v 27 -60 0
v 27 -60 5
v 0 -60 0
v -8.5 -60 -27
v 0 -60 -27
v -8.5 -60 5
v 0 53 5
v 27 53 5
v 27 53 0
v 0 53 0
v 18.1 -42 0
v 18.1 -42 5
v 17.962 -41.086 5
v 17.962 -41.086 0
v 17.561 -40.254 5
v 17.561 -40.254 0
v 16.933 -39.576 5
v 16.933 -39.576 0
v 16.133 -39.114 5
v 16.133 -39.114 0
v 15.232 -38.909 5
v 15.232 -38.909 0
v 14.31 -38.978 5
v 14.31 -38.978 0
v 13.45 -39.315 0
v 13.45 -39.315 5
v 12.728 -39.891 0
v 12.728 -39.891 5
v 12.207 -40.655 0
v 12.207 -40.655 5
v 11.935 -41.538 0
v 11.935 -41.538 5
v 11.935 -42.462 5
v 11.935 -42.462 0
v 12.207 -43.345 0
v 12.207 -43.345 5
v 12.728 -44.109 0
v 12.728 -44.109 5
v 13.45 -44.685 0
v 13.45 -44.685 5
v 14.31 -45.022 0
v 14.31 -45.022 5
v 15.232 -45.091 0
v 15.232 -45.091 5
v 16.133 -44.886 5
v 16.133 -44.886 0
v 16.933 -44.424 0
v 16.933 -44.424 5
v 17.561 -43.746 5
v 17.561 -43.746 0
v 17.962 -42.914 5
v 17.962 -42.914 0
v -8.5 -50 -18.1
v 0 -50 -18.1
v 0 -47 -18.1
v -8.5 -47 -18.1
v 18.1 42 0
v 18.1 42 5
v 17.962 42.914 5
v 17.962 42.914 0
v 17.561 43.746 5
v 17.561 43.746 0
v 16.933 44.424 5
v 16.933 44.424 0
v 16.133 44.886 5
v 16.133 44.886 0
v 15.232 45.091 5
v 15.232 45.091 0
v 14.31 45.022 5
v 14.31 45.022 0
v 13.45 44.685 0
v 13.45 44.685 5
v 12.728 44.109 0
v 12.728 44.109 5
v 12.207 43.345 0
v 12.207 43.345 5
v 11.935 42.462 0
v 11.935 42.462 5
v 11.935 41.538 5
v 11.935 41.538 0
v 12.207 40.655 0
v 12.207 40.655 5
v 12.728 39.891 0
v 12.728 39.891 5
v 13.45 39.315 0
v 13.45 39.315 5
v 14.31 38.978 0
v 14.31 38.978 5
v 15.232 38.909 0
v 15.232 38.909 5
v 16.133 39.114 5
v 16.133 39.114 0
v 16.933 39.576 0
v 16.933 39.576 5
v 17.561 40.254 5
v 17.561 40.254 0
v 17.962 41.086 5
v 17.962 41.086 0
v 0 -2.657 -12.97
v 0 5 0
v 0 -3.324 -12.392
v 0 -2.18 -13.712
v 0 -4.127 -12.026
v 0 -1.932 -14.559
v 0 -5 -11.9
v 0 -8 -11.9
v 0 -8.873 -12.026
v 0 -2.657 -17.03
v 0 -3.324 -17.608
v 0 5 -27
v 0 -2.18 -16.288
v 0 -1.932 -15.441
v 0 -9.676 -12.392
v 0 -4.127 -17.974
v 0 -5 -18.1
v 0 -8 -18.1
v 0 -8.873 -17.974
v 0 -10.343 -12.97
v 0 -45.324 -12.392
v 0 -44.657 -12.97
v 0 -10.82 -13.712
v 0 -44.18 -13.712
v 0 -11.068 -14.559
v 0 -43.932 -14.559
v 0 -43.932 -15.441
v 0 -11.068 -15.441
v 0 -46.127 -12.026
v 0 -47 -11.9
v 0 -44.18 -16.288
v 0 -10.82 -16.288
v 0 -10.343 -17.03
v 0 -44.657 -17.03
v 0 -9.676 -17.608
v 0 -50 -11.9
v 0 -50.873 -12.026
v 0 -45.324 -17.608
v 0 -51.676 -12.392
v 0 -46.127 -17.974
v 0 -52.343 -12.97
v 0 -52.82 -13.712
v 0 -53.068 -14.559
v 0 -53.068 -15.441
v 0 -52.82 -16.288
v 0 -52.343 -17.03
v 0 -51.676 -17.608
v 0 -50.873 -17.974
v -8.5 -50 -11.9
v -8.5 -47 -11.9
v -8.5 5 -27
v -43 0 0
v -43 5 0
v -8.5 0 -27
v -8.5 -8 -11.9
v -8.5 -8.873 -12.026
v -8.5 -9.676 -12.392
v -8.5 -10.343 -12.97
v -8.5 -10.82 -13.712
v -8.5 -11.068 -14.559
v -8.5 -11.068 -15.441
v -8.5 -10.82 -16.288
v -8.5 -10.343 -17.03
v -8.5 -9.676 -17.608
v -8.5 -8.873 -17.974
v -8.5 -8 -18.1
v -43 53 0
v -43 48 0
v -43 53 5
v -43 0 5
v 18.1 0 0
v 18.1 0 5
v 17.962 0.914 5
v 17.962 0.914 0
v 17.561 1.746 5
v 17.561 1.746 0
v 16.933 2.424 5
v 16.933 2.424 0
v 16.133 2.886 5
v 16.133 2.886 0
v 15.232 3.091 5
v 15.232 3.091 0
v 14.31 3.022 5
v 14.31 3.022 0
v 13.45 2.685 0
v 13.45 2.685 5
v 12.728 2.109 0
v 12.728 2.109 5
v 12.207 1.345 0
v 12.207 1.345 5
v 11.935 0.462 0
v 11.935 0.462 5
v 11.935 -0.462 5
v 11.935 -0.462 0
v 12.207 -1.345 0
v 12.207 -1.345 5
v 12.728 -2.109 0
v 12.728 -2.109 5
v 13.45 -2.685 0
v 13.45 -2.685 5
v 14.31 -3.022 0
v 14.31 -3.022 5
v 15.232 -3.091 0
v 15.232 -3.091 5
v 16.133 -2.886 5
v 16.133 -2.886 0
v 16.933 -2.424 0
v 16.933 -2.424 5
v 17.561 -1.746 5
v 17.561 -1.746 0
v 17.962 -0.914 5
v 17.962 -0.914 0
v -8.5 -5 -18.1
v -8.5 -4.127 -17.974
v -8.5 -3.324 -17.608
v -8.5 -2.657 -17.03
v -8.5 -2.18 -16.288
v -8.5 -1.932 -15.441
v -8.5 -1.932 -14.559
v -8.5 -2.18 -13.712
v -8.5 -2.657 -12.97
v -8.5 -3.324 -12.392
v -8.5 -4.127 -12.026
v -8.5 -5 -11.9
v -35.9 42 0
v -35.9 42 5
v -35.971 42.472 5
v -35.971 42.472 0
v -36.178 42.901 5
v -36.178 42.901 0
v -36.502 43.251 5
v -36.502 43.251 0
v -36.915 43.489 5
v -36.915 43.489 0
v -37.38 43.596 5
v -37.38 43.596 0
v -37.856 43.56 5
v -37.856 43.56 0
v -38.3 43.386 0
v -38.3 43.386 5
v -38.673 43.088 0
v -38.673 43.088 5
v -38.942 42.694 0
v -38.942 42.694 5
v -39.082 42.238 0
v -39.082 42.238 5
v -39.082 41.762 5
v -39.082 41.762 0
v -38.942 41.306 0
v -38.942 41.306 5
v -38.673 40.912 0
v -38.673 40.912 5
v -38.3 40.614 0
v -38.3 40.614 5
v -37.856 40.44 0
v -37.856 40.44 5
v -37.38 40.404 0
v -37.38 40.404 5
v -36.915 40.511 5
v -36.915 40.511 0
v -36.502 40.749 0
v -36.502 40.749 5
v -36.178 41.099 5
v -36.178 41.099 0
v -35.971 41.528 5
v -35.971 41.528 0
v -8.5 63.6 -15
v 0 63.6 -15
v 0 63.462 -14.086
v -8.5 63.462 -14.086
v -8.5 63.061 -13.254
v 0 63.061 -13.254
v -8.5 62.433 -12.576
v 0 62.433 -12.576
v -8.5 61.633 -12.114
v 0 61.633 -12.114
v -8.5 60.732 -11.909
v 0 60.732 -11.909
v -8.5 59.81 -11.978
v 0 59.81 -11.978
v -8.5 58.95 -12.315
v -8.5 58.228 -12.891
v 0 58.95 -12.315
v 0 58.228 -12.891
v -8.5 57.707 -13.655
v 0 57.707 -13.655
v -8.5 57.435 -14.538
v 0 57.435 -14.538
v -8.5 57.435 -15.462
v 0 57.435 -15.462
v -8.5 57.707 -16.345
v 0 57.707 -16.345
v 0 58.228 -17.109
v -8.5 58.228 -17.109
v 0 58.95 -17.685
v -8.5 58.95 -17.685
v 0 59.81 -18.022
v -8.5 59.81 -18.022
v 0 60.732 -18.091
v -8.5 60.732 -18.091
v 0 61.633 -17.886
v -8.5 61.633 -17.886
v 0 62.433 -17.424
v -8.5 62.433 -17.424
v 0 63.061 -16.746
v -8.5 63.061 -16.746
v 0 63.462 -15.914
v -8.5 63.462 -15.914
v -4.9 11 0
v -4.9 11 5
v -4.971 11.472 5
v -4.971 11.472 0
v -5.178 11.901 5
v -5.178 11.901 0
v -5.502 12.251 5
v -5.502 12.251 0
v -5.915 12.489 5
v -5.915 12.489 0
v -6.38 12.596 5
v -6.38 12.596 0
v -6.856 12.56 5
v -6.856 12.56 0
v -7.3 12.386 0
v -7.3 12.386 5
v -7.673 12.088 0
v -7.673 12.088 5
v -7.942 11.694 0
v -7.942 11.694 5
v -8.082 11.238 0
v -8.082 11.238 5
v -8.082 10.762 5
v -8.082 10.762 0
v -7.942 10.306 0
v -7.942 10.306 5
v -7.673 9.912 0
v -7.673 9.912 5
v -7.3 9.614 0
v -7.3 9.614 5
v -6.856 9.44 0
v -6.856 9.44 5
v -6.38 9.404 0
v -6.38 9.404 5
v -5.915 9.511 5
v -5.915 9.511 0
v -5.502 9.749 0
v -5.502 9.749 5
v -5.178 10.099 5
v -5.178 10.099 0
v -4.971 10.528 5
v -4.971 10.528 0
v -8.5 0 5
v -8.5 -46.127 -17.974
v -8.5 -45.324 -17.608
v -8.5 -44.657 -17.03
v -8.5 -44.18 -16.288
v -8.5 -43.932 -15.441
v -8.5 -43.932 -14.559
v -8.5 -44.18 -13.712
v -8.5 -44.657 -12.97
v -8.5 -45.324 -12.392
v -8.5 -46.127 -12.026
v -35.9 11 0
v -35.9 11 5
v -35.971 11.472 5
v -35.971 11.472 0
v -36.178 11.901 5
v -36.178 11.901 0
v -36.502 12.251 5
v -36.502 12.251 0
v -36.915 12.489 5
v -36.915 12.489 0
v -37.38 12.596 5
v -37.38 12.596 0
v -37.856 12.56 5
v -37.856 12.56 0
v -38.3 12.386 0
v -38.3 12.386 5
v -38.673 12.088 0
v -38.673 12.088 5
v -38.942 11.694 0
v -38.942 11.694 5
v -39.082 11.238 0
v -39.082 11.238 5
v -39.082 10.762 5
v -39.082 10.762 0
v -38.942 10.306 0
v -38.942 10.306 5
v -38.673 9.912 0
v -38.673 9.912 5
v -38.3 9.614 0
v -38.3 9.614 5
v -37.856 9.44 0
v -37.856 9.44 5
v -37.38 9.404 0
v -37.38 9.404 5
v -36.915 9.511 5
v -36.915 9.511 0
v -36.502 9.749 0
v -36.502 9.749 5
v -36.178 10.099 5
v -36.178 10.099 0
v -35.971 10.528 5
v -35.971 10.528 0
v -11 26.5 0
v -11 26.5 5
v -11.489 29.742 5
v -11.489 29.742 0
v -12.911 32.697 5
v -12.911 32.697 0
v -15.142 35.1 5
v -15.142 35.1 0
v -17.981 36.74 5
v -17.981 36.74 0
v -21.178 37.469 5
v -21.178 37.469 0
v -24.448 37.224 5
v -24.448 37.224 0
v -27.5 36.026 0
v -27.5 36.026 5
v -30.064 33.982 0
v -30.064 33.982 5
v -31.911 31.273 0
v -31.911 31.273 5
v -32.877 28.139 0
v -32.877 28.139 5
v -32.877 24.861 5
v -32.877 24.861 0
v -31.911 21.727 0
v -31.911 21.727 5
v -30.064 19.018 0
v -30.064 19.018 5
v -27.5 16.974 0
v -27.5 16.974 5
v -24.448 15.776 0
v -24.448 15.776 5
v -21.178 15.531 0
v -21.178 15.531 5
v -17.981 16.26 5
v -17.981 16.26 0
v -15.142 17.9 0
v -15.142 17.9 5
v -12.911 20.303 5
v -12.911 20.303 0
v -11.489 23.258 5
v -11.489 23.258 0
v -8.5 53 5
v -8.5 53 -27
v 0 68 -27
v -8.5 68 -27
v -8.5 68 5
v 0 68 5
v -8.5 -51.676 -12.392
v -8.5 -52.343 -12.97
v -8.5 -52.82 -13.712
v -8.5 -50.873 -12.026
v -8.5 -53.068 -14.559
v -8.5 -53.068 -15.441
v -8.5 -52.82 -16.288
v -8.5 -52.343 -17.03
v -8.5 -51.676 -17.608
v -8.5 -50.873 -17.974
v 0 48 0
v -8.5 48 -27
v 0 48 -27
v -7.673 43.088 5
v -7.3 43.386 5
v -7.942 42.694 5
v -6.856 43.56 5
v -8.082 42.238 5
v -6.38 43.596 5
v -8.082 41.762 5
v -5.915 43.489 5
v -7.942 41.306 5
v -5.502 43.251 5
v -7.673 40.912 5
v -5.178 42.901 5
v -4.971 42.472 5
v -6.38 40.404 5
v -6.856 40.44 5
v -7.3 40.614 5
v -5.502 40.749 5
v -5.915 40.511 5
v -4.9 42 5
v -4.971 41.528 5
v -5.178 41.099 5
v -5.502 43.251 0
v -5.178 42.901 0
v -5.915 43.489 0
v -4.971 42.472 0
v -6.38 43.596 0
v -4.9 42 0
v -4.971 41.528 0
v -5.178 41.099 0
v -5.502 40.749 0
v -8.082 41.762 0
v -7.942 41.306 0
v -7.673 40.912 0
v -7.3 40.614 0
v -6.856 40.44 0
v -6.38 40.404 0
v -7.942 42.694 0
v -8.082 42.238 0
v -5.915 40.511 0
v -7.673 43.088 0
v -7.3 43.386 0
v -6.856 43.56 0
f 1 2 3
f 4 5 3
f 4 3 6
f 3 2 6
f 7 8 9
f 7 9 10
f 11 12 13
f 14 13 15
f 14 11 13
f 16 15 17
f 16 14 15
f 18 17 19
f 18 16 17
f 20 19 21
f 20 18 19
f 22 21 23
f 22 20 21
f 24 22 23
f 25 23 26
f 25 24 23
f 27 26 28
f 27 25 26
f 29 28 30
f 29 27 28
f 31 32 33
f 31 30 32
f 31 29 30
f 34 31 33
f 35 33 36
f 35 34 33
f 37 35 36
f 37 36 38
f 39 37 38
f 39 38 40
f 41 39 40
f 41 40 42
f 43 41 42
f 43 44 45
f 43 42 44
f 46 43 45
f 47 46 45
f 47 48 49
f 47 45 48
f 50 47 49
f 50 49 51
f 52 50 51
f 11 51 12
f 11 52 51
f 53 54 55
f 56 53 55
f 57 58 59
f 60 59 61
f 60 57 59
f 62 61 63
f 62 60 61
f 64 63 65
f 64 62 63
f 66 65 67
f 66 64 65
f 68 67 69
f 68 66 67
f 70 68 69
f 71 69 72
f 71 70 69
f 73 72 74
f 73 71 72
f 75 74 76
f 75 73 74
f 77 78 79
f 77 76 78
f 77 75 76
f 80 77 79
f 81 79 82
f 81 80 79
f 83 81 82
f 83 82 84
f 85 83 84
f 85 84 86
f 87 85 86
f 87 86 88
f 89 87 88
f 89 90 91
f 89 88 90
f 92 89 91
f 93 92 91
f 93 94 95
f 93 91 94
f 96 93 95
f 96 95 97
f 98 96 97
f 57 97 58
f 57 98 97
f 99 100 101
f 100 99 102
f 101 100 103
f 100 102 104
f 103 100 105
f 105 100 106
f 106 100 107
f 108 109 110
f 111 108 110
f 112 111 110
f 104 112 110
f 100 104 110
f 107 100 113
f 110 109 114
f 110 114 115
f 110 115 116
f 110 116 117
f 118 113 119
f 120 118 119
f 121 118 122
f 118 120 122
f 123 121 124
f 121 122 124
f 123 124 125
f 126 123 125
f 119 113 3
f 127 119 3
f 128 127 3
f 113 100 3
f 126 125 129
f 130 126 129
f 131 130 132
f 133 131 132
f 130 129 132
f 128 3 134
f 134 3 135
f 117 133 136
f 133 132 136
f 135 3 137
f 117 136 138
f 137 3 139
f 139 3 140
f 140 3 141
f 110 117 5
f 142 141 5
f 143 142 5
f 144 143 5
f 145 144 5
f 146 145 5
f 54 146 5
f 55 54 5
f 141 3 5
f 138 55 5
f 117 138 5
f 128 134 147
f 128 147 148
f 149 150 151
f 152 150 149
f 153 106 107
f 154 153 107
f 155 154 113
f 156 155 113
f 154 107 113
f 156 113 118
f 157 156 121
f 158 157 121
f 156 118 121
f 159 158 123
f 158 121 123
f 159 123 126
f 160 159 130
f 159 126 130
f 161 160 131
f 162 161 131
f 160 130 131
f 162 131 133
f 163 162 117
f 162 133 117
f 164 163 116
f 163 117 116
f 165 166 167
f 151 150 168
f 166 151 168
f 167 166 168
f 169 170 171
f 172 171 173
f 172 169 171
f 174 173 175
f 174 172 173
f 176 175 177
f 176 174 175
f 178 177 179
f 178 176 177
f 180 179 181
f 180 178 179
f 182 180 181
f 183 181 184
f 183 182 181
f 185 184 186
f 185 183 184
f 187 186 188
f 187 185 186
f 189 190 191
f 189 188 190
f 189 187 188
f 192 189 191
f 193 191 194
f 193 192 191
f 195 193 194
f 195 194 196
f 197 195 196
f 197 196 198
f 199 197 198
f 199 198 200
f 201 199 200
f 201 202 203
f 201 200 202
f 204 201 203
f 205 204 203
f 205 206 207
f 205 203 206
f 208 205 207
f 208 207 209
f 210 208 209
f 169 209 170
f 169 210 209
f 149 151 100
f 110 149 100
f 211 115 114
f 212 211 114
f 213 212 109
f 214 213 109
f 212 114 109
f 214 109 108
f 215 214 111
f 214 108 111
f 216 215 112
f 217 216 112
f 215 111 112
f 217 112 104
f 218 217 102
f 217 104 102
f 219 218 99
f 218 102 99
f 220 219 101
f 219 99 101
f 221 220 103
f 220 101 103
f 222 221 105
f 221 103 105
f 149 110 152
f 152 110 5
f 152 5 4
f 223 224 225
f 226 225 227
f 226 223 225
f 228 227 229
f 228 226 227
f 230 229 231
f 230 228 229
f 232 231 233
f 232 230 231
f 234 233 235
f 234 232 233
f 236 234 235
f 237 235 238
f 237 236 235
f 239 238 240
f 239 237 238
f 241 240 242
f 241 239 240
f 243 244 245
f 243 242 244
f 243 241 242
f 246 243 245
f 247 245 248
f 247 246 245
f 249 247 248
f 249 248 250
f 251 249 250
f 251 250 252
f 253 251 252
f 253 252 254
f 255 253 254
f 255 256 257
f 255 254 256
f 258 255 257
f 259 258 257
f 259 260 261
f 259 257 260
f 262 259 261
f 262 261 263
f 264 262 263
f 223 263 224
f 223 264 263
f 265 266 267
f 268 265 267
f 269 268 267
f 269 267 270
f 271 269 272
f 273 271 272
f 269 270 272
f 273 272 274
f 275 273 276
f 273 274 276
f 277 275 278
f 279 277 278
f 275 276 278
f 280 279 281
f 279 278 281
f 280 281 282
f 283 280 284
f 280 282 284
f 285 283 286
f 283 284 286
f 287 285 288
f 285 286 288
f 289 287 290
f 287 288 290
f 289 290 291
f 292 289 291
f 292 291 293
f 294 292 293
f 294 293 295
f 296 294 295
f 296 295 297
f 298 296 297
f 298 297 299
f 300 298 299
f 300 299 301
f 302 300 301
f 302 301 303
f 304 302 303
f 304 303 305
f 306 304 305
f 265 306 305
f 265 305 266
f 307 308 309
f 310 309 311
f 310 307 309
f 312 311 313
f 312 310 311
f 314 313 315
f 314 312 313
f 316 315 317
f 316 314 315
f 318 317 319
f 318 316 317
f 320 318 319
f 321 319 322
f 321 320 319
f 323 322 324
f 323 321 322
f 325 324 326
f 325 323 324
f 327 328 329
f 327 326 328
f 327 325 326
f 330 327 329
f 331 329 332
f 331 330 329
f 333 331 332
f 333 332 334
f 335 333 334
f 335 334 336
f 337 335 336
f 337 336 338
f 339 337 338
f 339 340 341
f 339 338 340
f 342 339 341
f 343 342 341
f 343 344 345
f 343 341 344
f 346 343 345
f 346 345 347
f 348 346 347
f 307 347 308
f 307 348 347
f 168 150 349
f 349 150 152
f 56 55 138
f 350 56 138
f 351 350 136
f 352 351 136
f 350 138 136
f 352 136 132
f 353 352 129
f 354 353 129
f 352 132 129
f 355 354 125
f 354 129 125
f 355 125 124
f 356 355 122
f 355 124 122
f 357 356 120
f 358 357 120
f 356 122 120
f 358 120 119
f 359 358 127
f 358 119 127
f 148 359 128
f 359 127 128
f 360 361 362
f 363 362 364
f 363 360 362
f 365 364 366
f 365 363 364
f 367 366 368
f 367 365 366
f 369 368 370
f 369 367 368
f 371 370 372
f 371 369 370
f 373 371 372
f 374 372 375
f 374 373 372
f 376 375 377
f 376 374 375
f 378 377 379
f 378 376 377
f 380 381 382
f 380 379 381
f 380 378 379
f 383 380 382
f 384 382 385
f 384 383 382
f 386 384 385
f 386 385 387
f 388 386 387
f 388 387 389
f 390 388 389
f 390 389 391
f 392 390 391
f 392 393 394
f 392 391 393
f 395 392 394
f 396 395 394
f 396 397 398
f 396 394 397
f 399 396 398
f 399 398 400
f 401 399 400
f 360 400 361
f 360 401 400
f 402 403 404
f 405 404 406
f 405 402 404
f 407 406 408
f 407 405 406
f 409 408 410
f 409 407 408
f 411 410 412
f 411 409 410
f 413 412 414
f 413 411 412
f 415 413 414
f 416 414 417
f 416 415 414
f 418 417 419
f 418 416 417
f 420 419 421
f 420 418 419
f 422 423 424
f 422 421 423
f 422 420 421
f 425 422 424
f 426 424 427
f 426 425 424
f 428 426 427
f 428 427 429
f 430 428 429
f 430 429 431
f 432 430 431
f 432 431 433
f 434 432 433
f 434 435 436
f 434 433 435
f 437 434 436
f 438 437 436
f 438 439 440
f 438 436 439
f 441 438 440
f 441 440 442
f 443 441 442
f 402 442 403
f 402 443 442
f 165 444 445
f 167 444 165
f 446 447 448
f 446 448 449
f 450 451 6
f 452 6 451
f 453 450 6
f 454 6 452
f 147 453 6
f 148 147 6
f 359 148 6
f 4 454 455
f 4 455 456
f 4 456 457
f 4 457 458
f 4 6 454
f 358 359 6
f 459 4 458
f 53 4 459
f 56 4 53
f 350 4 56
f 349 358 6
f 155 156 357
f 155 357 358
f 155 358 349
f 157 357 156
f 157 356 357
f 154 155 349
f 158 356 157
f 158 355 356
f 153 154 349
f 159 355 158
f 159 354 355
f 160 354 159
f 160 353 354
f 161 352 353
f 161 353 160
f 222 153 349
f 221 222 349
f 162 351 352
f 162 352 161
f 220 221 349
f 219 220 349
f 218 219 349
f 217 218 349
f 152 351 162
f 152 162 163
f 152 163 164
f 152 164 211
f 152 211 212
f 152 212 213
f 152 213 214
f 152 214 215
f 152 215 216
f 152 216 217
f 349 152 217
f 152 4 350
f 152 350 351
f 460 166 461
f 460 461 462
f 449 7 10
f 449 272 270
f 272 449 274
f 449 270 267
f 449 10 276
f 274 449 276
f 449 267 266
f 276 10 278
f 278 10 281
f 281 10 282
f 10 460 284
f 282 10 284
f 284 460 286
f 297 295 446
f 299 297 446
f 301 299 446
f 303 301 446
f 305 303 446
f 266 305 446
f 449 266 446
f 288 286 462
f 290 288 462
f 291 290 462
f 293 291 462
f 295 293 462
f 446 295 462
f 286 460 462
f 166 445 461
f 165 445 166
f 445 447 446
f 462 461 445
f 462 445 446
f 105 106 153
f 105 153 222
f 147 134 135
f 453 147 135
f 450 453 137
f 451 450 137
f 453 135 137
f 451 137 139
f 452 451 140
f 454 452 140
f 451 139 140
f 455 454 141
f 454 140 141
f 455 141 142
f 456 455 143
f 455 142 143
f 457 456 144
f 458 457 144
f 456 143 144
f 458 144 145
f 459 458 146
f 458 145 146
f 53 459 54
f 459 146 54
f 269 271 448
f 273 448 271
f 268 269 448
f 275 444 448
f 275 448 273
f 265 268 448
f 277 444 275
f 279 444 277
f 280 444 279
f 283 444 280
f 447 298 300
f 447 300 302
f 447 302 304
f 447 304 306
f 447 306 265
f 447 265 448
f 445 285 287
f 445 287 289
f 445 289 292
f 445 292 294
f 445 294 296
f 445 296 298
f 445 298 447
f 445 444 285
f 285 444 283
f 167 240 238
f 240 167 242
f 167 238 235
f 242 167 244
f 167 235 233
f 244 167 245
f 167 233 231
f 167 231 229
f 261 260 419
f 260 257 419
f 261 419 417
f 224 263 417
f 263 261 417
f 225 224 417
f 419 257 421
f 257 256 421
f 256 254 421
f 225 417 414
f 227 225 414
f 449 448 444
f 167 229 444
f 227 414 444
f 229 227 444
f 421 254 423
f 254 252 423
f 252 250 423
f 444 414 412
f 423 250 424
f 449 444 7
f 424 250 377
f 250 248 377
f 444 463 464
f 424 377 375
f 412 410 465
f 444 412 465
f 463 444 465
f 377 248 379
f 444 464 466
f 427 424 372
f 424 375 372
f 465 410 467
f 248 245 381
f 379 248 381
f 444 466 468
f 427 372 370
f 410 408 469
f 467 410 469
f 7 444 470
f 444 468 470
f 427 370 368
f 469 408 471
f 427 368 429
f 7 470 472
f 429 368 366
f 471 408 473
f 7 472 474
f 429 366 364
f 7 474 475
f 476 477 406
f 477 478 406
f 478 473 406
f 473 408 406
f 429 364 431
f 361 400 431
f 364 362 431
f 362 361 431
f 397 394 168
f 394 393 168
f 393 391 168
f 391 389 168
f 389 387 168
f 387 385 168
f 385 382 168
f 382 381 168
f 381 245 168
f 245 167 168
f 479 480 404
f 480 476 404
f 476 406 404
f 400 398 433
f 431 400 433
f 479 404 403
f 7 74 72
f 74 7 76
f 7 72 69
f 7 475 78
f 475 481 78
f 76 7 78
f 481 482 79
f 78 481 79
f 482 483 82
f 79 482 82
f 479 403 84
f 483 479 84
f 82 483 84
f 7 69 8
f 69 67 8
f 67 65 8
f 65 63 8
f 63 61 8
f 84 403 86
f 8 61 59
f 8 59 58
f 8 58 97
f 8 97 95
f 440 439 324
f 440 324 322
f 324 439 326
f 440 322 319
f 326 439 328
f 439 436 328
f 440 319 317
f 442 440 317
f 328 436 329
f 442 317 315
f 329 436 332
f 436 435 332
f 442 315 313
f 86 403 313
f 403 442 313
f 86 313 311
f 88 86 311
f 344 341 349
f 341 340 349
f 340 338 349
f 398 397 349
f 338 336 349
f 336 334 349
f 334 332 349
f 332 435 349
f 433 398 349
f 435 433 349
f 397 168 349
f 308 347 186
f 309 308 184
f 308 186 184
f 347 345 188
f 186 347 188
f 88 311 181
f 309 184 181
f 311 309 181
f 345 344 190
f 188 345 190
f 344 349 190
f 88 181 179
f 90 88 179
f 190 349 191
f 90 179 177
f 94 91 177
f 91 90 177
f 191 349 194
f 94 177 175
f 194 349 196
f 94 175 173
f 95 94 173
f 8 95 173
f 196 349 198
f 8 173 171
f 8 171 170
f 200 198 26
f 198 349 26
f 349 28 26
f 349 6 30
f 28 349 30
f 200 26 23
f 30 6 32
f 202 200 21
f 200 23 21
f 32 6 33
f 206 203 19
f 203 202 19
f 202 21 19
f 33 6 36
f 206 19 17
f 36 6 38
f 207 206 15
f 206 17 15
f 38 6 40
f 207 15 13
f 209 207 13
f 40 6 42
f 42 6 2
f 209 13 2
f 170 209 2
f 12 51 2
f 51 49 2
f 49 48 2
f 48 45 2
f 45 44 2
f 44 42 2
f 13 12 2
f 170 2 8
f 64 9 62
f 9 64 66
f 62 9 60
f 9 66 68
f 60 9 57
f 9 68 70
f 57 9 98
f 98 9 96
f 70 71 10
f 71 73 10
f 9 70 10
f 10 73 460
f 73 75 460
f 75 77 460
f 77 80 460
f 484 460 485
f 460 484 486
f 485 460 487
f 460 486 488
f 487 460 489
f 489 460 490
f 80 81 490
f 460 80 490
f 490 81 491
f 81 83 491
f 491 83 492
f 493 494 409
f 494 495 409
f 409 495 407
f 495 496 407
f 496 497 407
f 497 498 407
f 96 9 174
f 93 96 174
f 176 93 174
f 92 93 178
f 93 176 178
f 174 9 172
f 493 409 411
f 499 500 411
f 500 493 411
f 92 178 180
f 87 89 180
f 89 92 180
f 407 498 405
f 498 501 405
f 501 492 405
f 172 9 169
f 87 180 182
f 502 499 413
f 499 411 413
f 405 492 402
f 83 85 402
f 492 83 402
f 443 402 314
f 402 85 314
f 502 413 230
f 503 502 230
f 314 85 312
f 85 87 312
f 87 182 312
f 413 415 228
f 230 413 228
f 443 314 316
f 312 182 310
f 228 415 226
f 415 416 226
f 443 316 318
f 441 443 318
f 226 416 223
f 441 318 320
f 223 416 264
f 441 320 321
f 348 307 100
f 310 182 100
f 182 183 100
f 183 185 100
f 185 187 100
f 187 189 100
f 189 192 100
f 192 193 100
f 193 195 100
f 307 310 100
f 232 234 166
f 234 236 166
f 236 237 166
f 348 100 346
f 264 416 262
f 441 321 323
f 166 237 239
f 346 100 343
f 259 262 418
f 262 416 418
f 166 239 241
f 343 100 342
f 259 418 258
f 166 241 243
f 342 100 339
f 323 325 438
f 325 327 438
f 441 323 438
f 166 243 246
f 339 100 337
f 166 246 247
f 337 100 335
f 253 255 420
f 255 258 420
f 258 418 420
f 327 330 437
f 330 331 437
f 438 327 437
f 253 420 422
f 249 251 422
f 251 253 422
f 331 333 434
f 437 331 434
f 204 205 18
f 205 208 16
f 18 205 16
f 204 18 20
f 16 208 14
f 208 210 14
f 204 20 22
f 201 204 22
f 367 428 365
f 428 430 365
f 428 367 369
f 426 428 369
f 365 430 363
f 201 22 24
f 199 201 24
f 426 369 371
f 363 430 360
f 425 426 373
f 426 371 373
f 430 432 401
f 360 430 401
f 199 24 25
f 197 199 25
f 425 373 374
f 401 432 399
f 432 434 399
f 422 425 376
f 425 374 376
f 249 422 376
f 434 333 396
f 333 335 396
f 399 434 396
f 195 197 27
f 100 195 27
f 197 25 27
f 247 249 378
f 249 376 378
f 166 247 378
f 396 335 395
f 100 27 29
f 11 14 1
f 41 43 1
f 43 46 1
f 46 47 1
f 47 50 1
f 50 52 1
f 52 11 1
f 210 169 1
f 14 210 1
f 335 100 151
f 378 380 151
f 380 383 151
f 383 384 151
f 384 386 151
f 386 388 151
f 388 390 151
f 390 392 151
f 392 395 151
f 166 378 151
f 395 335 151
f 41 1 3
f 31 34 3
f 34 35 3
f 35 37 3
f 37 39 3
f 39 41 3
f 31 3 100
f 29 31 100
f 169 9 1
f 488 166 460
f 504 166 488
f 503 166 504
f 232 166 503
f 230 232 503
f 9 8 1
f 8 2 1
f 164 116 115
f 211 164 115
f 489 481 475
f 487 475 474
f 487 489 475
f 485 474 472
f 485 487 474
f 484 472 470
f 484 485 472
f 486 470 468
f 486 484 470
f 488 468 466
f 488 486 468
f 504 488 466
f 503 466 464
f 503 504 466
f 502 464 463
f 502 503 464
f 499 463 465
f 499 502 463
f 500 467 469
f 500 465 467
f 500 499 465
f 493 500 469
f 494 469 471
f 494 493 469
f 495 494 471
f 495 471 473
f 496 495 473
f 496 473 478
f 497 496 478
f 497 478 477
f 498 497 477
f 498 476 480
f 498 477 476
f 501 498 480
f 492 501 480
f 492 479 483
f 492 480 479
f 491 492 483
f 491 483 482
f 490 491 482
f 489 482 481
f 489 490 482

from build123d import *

# Parameters (mm, degrees)
PAD_DEPTH         = 60
PAD_DEPTH_BACK    = 53
SKETCH001_R       = 11
SKETCH001_R_2     = 1.6
SKETCH001_R_3     = 3.1
SKETCH001_W       = 34.5
SKETCH001_H       = 60
POCKET_DEPTH      = 27.001
POCKET_DEPTH_BACK = -5.001
POCKET001_DEPTH   = 43.001
PAD001_DEPTH      = 5
PAD002_DEPTH      = 5
SKETCH005_W       = 43
SKETCH005_H       = 27
POCKET002_DEPTH   = 43.001
SKETCH006_W       = 8.5
SKETCH006_H       = 32
PAD003_DEPTH      = 15
SKETCH007_R       = 3.1
POCKET003_DEPTH   = 43.001


with BuildPart() as part:
    # Sketch → Pad (new body, two sides)
    with BuildSketch(Plane.XZ) as pad_sk:
        Polygon((-43, 5), (27, 5), (27, 0), (0, 0), (0, -27), (-8.5, -27), (-8.5, 0), (-43, 0), align=None)
    extrude(amount=PAD_DEPTH)
    extrude(pad_sk.sketch, amount=-PAD_DEPTH_BACK)

    # Sketch001 → Pocket (cut, two sides)
    with BuildSketch(Plane.XY) as pocket_sk:
        with Locations((-22, 26.5)):
            Circle(SKETCH001_R)
        with Locations((-37.5, 42)):
            Circle(SKETCH001_R_2)
        with Locations((-6.5, 42)):
            Circle(SKETCH001_R_2)
        with Locations((-37.5, 11)):
            Circle(SKETCH001_R_2)
        with Locations((-6.5, 11)):
            Circle(SKETCH001_R_2)
        with Locations((15, 42)):
            Circle(SKETCH001_R_3)
        with Locations((15, -42)):
            Circle(SKETCH001_R_3)
        with Locations((15, 0)):
            Circle(SKETCH001_R_3)
        with Locations((-25.75, -30)):
            Rectangle(SKETCH001_W, SKETCH001_H)
    extrude(amount=-POCKET_DEPTH, mode=Mode.SUBTRACT)
    extrude(pocket_sk.sketch, amount=-POCKET_DEPTH_BACK, mode=Mode.SUBTRACT)

    # Sketch002 → Pocket001 (cut, through all)
    with BuildSketch(Plane.YZ):
        with BuildLine():
            ThreePointArc((-50, -11.9), (-53.1, -15), (-50, -18.1))
            Line((-50, -18.1), (-47, -18.1))
            ThreePointArc((-47, -18.1), (-43.9, -15), (-47, -11.9))
            Line((-50, -11.9), (-47, -11.9))
        make_face()
        with BuildLine():
            ThreePointArc((-8, -11.9), (-11.1, -15), (-8, -18.1))
            Line((-8, -18.1), (-5, -18.1))
            ThreePointArc((-5, -18.1), (-1.9, -15), (-5, -11.9))
            Line((-8, -11.9), (-5, -11.9))
        make_face()
    extrude(amount=-POCKET001_DEPTH, mode=Mode.SUBTRACT)

    # Sketch003 → Pad001 (join)
    with BuildSketch(Plane.XZ):
        Polygon((-43, 5), (-43, 0), (-8.5, -27), (0, -27), (0, 5), align=None)
    extrude(amount=-PAD001_DEPTH)

    # Sketch004 (on Face1 of Pad001) → Pad002 (join)
    with BuildSketch(Plane(origin=(0, 53, 0), x_dir=(1, 0, 0), z_dir=(0, 1, 0))):
        Polygon((-43, -5), (0, -5), (0, 27), (-8.5, 27), (-43, 0), align=None)
    extrude(amount=-PAD002_DEPTH)

    # Sketch005 → Pocket002 (cut, through all)
    with BuildSketch(Plane.YZ):
        with Locations((26.5, -13.5)):
            Rectangle(SKETCH005_W, SKETCH005_H)
    extrude(amount=-POCKET002_DEPTH, mode=Mode.SUBTRACT)

    # Sketch006 (on Face4 of Pocket002) → Pad003 (join)
    with BuildSketch(Plane(origin=(0, 53, 0), x_dir=(1, 0, 0), z_dir=(0, 1, 0))):
        with Locations((-4.25, 11)):
            Rectangle(SKETCH006_W, SKETCH006_H)
    extrude(amount=PAD003_DEPTH)

    # Sketch007 → Pocket003 (cut, through all)
    with BuildSketch(Plane.YZ):
        with Locations((60.5, -15)):
            Circle(SKETCH007_R)
    extrude(amount=-POCKET003_DEPTH, mode=Mode.SUBTRACT)


solid = part.part
